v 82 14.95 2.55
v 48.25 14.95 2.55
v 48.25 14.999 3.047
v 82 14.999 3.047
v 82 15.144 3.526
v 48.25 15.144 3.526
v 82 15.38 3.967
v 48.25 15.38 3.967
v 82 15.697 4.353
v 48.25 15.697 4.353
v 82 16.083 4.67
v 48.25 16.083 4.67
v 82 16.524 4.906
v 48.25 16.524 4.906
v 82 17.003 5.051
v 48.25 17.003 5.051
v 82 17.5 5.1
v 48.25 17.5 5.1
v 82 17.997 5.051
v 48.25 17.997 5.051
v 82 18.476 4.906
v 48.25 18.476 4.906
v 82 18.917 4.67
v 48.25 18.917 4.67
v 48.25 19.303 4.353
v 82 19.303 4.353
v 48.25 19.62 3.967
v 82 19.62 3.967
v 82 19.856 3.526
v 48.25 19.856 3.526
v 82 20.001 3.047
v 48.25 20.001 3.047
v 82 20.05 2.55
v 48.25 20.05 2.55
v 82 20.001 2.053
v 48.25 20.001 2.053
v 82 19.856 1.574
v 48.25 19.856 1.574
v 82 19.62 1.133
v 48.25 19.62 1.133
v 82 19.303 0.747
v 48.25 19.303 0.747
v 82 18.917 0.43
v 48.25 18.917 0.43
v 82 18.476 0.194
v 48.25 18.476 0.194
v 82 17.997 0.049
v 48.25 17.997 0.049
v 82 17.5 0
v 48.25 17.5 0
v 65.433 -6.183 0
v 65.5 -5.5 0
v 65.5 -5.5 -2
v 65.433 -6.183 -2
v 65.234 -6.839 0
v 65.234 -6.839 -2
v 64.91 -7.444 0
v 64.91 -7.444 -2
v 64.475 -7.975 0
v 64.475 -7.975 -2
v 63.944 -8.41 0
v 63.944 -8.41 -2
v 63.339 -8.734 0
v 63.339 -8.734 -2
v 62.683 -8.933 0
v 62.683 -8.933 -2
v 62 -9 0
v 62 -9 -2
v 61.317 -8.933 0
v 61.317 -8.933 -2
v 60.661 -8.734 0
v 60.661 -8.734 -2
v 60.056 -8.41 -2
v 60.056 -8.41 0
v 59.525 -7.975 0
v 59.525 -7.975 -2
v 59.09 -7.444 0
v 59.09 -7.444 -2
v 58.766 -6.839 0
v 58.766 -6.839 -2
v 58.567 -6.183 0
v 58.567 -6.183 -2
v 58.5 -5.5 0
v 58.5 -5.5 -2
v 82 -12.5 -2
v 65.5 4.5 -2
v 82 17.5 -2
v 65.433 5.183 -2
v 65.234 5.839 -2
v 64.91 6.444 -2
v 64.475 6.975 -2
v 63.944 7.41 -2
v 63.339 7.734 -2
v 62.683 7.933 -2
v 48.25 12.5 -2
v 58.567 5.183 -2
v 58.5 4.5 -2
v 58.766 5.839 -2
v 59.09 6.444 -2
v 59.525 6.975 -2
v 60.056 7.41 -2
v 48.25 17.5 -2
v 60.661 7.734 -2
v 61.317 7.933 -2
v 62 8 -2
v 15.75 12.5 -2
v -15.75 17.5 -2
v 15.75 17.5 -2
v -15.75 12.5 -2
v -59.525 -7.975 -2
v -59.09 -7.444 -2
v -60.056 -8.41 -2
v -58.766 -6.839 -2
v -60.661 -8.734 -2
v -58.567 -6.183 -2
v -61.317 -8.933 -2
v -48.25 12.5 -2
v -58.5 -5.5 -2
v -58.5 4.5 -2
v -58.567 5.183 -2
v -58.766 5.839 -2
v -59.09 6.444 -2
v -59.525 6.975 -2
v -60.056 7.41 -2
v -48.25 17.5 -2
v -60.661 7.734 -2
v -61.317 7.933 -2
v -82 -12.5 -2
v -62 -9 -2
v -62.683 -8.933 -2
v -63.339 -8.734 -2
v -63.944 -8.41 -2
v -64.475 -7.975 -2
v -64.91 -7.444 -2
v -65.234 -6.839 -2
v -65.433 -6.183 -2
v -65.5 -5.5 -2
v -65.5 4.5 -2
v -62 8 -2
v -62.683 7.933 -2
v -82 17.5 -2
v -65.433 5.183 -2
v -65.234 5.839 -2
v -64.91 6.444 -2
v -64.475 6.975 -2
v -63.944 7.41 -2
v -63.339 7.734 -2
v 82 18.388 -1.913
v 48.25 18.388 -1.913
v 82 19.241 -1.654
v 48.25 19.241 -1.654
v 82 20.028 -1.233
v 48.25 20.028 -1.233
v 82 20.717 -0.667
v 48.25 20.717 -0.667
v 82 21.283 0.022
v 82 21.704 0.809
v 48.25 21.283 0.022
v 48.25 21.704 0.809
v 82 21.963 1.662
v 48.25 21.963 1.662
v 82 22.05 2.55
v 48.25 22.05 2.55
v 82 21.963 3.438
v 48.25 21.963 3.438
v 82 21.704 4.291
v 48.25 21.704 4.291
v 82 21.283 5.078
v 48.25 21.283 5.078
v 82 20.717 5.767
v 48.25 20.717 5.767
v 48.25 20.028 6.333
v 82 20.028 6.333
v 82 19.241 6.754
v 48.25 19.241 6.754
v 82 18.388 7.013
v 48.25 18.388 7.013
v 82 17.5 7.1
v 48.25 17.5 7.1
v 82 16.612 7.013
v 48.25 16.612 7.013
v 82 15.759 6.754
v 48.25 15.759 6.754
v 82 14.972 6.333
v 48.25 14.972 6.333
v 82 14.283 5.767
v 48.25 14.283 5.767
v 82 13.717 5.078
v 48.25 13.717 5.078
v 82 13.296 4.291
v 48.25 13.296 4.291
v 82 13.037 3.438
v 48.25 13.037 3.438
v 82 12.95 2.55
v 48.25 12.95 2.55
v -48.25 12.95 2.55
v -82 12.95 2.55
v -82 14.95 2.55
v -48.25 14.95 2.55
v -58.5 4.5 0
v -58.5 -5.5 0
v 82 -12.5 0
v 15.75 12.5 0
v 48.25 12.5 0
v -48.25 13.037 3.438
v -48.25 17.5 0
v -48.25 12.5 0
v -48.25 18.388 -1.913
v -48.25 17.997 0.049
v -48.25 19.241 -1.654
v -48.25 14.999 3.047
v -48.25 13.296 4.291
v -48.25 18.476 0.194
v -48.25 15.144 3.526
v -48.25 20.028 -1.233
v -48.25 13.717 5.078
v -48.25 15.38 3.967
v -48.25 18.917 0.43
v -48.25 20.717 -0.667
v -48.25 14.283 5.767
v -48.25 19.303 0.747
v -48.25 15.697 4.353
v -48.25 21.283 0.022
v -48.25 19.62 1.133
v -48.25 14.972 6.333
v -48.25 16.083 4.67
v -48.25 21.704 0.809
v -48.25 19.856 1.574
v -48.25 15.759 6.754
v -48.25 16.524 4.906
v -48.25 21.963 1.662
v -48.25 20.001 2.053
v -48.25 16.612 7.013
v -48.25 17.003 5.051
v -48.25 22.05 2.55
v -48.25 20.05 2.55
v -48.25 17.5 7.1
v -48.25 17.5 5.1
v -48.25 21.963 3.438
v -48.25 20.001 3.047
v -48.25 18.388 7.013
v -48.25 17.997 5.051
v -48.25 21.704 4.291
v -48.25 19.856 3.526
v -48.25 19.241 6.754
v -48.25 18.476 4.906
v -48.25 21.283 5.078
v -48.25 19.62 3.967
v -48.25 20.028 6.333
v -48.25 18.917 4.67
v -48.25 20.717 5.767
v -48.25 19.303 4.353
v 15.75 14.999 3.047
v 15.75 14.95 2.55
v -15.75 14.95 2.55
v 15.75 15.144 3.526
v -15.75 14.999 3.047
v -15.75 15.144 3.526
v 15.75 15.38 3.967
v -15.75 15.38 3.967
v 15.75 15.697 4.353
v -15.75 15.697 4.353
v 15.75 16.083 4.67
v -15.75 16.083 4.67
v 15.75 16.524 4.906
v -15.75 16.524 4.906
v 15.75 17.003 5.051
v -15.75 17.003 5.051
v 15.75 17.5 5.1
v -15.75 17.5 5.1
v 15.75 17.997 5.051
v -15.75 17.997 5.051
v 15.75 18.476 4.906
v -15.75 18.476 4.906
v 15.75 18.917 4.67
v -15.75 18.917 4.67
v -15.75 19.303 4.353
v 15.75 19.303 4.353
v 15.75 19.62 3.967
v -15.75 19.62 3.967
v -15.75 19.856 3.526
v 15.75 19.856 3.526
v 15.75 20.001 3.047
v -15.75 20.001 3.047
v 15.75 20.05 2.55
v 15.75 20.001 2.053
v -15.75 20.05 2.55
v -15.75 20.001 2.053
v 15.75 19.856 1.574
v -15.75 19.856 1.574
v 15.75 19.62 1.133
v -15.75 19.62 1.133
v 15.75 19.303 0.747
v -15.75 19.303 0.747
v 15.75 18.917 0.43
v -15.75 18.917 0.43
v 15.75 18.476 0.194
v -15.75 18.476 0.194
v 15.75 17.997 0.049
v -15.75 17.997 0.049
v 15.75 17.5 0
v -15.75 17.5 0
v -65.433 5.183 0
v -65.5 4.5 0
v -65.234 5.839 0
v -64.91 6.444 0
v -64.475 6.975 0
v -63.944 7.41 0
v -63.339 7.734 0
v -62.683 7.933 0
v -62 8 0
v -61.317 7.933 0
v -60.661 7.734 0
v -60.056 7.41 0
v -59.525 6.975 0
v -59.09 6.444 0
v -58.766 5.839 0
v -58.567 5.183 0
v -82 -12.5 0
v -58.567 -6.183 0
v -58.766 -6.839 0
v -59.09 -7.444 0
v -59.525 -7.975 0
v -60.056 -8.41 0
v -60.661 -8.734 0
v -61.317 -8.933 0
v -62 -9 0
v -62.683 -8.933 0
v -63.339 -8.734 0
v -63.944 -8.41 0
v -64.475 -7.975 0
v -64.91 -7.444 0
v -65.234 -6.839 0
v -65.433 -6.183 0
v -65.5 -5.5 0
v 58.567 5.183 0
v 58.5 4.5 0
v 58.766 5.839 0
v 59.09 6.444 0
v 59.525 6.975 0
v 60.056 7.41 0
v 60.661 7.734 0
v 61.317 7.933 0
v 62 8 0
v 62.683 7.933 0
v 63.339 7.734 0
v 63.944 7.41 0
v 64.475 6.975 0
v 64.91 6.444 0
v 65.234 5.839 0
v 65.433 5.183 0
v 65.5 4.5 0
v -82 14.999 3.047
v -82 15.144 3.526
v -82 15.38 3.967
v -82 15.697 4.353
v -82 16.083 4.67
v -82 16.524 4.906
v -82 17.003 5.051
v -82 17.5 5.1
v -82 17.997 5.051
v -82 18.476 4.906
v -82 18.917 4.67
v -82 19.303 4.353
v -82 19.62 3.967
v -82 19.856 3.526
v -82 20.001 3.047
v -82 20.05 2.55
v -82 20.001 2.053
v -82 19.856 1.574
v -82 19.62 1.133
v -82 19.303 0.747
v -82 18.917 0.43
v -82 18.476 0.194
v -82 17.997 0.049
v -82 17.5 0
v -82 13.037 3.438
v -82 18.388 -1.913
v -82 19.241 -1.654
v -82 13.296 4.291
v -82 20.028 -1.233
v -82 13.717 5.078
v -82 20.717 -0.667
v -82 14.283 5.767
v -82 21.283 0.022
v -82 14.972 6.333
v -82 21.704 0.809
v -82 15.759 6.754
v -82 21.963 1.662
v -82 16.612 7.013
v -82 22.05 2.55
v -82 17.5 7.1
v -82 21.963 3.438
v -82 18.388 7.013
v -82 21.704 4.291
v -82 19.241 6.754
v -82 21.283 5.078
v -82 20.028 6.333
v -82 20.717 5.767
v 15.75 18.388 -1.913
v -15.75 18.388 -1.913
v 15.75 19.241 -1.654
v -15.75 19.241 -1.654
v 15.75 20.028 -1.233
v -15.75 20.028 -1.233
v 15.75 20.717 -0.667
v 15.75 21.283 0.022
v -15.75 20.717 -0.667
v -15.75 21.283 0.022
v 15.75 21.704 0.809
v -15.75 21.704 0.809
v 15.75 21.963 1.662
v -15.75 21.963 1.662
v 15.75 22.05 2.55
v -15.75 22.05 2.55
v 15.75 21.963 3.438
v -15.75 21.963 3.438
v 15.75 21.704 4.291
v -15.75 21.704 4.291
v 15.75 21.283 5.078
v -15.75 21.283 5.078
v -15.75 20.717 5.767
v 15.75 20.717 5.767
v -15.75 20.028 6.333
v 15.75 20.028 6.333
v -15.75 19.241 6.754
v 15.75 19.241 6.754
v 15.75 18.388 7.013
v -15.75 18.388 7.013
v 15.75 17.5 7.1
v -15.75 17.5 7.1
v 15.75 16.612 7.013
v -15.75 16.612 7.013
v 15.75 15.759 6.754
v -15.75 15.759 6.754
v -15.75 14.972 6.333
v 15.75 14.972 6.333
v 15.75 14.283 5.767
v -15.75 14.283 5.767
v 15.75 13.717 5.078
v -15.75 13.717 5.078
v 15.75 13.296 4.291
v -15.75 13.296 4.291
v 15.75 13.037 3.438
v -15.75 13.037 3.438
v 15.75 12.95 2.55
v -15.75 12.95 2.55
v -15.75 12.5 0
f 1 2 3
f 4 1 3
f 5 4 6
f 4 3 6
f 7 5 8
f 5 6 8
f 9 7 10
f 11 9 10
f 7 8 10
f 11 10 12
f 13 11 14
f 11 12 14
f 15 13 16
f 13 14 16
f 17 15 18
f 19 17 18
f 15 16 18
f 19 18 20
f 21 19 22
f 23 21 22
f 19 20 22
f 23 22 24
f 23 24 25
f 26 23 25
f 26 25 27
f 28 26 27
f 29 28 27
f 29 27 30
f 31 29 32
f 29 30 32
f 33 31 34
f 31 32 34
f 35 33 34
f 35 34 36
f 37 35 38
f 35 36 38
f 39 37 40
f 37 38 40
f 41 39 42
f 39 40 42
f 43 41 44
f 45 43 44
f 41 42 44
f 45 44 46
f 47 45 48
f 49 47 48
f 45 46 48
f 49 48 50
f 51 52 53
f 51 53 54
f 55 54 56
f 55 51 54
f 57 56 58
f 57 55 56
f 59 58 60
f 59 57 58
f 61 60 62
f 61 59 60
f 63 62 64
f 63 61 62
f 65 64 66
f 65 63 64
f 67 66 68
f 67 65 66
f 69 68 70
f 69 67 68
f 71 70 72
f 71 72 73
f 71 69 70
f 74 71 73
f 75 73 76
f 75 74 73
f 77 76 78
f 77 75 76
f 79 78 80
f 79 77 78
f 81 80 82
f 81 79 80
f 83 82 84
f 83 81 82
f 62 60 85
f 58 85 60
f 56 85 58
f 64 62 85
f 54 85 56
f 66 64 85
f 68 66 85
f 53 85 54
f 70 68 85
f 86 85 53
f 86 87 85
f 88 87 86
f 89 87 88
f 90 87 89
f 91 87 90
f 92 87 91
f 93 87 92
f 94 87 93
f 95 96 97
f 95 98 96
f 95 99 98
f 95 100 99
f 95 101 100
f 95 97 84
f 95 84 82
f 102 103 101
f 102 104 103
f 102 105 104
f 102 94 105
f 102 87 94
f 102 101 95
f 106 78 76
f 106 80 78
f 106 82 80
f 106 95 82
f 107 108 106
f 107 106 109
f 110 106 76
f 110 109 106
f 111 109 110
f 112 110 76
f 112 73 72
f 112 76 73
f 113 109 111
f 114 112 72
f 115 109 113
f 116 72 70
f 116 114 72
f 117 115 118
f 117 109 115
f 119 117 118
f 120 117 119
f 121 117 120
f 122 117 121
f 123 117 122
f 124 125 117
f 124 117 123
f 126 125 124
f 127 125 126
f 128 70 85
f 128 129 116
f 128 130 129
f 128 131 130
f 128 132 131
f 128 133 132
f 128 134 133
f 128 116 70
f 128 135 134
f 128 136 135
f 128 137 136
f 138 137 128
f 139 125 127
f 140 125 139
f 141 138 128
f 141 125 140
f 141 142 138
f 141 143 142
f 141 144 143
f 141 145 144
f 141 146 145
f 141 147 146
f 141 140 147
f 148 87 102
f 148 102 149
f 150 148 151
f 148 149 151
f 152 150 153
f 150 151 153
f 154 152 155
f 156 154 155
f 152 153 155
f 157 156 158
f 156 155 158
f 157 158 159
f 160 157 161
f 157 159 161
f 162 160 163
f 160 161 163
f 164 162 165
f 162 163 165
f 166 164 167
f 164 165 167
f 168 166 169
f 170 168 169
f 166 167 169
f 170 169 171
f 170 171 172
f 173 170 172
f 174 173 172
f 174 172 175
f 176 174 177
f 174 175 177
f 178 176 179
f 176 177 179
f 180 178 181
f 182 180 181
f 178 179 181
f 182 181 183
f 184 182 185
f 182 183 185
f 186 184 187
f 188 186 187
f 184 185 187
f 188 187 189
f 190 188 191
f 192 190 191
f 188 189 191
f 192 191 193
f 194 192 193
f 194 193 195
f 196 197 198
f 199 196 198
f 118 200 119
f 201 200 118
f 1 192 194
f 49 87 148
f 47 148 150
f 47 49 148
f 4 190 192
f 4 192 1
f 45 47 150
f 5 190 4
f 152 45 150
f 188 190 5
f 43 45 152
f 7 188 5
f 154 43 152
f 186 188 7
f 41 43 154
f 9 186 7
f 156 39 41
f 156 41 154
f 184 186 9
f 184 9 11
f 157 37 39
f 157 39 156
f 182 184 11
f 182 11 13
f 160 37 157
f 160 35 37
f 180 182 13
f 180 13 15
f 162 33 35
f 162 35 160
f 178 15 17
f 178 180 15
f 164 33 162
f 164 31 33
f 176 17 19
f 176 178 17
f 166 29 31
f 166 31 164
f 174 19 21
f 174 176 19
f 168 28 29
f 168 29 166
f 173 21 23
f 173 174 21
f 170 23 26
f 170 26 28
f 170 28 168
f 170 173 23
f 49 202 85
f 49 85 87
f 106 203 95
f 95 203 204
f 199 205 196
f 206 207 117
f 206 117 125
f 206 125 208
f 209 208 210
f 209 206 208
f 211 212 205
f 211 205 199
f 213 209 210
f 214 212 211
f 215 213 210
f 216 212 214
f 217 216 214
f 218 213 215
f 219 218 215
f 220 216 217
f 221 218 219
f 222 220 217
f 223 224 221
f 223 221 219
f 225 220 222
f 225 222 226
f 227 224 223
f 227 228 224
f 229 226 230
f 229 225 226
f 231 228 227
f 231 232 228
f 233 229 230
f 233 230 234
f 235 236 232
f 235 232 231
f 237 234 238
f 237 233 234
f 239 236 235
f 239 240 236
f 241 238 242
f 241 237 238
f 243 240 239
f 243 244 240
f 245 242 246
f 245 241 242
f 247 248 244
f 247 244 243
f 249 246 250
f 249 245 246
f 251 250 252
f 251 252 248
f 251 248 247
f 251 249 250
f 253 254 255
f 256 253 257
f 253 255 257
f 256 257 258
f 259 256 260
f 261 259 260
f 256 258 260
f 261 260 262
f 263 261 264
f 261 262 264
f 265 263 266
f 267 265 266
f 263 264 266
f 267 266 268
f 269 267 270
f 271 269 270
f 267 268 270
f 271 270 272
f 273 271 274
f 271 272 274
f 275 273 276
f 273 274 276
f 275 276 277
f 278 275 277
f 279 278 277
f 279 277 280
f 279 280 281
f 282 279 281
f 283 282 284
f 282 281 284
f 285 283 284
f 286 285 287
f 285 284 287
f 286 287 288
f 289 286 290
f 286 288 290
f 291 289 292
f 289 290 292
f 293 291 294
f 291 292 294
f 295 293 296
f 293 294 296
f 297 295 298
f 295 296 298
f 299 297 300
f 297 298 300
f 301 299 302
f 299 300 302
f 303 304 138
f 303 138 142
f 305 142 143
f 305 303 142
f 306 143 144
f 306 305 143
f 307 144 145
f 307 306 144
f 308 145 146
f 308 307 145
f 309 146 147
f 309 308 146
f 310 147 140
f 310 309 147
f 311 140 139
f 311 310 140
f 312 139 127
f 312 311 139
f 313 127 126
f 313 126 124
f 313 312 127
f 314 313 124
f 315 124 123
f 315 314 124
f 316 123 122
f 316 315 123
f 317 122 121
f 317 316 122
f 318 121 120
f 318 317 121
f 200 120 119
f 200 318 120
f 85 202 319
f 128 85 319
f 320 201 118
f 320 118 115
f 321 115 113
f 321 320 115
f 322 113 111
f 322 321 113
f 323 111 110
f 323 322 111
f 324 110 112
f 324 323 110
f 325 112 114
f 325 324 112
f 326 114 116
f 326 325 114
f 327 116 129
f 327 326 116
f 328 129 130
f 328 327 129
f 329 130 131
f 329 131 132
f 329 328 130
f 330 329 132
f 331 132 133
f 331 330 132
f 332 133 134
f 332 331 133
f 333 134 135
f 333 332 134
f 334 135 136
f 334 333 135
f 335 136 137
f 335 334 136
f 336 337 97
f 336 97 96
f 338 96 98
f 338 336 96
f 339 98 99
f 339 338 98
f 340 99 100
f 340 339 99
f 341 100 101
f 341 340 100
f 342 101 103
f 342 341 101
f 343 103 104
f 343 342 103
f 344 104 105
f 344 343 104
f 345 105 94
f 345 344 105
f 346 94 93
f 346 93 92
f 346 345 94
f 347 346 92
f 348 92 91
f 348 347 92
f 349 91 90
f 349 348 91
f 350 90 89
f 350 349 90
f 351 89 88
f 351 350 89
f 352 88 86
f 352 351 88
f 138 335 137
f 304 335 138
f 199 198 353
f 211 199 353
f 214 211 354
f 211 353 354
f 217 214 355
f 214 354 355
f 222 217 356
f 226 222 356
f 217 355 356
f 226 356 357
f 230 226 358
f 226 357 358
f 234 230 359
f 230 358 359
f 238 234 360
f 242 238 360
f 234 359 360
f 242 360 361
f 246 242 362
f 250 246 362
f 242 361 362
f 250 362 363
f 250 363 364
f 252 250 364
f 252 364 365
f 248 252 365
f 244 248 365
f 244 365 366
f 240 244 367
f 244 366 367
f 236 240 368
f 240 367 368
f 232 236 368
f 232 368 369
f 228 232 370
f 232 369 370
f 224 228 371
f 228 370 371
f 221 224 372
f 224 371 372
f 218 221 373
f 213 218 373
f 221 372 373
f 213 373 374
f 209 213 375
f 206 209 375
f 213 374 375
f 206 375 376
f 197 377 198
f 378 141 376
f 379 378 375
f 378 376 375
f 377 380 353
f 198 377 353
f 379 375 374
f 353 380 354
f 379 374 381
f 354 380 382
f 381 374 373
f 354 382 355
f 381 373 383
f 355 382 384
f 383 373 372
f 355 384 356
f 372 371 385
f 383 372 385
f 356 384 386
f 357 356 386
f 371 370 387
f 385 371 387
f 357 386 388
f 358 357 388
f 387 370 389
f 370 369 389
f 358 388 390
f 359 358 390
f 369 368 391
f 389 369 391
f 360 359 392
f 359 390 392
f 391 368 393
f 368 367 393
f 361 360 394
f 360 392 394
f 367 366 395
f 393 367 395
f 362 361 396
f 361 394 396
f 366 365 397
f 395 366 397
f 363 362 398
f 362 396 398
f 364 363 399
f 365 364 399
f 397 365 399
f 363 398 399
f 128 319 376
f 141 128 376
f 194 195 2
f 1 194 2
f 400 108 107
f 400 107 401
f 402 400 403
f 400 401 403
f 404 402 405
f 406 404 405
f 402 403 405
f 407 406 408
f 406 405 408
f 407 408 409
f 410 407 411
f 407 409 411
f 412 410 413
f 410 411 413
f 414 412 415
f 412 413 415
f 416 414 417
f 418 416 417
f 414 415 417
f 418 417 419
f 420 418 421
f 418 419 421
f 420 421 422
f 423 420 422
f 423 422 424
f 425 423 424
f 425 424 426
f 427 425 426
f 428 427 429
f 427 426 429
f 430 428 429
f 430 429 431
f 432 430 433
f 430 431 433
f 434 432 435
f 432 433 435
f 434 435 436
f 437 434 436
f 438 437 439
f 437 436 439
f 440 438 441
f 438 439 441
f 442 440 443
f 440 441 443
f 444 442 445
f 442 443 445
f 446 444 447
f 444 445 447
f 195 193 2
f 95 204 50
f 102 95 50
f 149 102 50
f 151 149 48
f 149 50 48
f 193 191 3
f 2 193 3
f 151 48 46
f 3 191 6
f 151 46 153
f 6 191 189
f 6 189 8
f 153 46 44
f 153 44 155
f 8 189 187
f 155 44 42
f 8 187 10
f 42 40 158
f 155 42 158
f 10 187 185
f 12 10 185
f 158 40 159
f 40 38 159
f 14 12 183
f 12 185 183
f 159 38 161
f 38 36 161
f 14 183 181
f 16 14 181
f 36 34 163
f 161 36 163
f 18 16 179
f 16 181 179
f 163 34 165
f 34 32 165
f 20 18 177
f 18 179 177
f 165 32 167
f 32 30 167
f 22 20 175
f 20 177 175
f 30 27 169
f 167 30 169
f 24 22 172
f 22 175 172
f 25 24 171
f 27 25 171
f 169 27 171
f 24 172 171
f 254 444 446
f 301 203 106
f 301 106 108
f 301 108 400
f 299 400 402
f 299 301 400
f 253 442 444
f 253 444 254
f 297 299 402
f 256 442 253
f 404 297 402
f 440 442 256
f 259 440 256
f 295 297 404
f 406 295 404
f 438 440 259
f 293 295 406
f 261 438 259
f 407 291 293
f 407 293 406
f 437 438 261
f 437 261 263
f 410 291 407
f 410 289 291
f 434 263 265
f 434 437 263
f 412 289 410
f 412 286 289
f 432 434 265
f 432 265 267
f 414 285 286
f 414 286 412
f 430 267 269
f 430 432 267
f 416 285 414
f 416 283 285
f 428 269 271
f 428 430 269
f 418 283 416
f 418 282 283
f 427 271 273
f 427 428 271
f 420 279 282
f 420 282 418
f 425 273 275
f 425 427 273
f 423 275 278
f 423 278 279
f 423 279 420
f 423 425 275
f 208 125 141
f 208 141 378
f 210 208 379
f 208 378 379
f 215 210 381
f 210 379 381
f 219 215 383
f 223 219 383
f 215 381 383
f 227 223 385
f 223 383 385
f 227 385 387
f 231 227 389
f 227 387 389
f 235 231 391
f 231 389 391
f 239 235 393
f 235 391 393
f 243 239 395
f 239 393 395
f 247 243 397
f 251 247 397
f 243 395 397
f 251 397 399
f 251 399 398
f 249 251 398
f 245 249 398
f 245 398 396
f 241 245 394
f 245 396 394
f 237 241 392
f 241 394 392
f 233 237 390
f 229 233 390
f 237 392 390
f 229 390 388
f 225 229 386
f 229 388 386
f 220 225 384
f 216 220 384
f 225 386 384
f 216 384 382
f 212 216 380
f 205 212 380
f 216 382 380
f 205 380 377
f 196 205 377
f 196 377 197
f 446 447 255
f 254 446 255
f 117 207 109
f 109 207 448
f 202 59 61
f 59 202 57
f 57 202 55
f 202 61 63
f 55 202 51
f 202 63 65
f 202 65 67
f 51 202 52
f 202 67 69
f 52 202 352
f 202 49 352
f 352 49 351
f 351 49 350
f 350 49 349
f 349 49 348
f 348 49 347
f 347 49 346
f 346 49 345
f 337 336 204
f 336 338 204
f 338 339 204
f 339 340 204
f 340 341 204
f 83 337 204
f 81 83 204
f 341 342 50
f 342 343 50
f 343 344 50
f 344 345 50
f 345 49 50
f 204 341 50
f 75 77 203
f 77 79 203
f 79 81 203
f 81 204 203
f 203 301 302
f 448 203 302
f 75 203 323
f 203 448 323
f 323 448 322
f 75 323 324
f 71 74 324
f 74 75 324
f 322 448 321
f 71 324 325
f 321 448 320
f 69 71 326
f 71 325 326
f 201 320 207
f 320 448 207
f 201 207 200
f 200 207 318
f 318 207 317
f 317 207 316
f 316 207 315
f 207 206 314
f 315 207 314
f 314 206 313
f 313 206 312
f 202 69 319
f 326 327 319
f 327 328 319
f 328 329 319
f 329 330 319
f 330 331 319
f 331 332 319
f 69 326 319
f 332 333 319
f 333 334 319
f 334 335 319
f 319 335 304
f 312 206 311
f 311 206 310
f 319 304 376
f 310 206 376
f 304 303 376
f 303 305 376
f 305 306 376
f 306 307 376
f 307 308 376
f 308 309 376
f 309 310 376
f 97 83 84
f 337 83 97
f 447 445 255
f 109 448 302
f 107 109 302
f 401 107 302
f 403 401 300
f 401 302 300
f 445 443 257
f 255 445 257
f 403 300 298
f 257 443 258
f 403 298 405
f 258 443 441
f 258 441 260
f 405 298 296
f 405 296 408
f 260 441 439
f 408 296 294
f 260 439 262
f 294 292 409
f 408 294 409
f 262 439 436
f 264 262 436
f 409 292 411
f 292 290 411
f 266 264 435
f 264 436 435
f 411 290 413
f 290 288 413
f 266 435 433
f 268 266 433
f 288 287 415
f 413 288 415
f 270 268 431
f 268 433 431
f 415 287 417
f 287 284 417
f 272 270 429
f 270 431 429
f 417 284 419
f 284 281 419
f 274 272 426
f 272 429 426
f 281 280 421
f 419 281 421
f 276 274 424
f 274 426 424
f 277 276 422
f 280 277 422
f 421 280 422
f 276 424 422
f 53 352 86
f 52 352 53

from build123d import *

# Parameters (mm, degrees)
BASIS_BLECH1_DEPTH       = 2
BLECHKANTENRAND1_START   = -82
BLECHKANTENRAND1_DEPTH   = 33.75
BLECHKANTENRAND1_START_2 = 48.25
BLECHKANTENRAND1_2_DEPTH = 33.75
BLECHKANTENRAND1_START_3 = -15.75
BLECHKANTENRAND1_3_DEPTH = 31.5


# Read off the part's stored shape, not the designer's step: Blechkantenrand1
# Sheet-metal steps are written as plain solids
with BuildPart() as part:
    # Skizze1 → Basis-Blech1 (new body)
    with BuildSketch(Plane.XY):
        Polygon((-82, 12.5), (-82, 17.5), (-48.25, 17.5), (-48.25, 12.5), (-15.75, 12.5), (-15.75, 17.5), (15.75, 17.5), (15.75, 12.5), (48.25, 12.5), (48.25, 17.5), (82, 17.5), (82, 12.5), (82, -12.5), (-82, -12.5), align=None)
        with BuildLine():
            Line((-58.5, 4.5), (-58.5, -5.5))
            ThreePointArc((-58.5, -5.5), (-62, -9), (-65.5, -5.5))
            Line((-65.5, -5.5), (-65.5, 4.5))
            ThreePointArc((-65.5, 4.5), (-62, 8), (-58.5, 4.5))
        make_face(mode=Mode.SUBTRACT)
        with BuildLine():
            Line((65.5, 4.5), (65.5, -5.5))
            ThreePointArc((65.5, -5.5), (62, -9), (58.5, -5.5))
            Line((58.5, -5.5), (58.5, 4.5))
            ThreePointArc((58.5, 4.5), (62, 8), (65.5, 4.5))
        make_face(mode=Mode.SUBTRACT)
    extrude(amount=-BASIS_BLECH1_DEPTH)

    # Blechkantenrand1 outline → Blechkantenrand1 (add)
    with BuildSketch(Plane.YZ.offset(BLECHKANTENRAND1_START)):
        with BuildLine():
            Line((12.95, 2.55), (14.95, 2.55))
            ThreePointArc((14.95, 2.55), (19.303122292, 4.353122292), (17.5, 0))
            Line((17.5, 0), (17.5, -2))
            ThreePointArc((17.5, -2), (20.717335854, 5.767335854), (12.95, 2.55))
        make_face()
    extrude(amount=BLECHKANTENRAND1_DEPTH)

    # Blechkantenrand1 2 outline → Blechkantenrand1 2 (add)
    with BuildSketch(Plane.YZ.offset(BLECHKANTENRAND1_START_2)):
        with BuildLine():
            Line((12.95, 2.55), (14.95, 2.55))
            ThreePointArc((14.95, 2.55), (19.303122292, 4.353122292), (17.5, 0))
            Line((17.5, 0), (17.5, -2))
            ThreePointArc((17.5, -2), (20.717335854, 5.767335854), (12.95, 2.55))
        make_face()
    extrude(amount=BLECHKANTENRAND1_2_DEPTH)

    # Blechkantenrand1 3 outline → Blechkantenrand1 3 (add)
    with BuildSketch(Plane.YZ.offset(BLECHKANTENRAND1_START_3)):
        with BuildLine():
            Line((12.95, 2.55), (14.95, 2.55))
            ThreePointArc((14.95, 2.55), (19.303122292, 4.353122292), (17.5, 0))
            Line((17.5, 0), (17.5, -2))
            ThreePointArc((17.5, -2), (20.717335854, 5.767335854), (12.95, 2.55))
        make_face()
    extrude(amount=BLECHKANTENRAND1_3_DEPTH)


solid = part.part
